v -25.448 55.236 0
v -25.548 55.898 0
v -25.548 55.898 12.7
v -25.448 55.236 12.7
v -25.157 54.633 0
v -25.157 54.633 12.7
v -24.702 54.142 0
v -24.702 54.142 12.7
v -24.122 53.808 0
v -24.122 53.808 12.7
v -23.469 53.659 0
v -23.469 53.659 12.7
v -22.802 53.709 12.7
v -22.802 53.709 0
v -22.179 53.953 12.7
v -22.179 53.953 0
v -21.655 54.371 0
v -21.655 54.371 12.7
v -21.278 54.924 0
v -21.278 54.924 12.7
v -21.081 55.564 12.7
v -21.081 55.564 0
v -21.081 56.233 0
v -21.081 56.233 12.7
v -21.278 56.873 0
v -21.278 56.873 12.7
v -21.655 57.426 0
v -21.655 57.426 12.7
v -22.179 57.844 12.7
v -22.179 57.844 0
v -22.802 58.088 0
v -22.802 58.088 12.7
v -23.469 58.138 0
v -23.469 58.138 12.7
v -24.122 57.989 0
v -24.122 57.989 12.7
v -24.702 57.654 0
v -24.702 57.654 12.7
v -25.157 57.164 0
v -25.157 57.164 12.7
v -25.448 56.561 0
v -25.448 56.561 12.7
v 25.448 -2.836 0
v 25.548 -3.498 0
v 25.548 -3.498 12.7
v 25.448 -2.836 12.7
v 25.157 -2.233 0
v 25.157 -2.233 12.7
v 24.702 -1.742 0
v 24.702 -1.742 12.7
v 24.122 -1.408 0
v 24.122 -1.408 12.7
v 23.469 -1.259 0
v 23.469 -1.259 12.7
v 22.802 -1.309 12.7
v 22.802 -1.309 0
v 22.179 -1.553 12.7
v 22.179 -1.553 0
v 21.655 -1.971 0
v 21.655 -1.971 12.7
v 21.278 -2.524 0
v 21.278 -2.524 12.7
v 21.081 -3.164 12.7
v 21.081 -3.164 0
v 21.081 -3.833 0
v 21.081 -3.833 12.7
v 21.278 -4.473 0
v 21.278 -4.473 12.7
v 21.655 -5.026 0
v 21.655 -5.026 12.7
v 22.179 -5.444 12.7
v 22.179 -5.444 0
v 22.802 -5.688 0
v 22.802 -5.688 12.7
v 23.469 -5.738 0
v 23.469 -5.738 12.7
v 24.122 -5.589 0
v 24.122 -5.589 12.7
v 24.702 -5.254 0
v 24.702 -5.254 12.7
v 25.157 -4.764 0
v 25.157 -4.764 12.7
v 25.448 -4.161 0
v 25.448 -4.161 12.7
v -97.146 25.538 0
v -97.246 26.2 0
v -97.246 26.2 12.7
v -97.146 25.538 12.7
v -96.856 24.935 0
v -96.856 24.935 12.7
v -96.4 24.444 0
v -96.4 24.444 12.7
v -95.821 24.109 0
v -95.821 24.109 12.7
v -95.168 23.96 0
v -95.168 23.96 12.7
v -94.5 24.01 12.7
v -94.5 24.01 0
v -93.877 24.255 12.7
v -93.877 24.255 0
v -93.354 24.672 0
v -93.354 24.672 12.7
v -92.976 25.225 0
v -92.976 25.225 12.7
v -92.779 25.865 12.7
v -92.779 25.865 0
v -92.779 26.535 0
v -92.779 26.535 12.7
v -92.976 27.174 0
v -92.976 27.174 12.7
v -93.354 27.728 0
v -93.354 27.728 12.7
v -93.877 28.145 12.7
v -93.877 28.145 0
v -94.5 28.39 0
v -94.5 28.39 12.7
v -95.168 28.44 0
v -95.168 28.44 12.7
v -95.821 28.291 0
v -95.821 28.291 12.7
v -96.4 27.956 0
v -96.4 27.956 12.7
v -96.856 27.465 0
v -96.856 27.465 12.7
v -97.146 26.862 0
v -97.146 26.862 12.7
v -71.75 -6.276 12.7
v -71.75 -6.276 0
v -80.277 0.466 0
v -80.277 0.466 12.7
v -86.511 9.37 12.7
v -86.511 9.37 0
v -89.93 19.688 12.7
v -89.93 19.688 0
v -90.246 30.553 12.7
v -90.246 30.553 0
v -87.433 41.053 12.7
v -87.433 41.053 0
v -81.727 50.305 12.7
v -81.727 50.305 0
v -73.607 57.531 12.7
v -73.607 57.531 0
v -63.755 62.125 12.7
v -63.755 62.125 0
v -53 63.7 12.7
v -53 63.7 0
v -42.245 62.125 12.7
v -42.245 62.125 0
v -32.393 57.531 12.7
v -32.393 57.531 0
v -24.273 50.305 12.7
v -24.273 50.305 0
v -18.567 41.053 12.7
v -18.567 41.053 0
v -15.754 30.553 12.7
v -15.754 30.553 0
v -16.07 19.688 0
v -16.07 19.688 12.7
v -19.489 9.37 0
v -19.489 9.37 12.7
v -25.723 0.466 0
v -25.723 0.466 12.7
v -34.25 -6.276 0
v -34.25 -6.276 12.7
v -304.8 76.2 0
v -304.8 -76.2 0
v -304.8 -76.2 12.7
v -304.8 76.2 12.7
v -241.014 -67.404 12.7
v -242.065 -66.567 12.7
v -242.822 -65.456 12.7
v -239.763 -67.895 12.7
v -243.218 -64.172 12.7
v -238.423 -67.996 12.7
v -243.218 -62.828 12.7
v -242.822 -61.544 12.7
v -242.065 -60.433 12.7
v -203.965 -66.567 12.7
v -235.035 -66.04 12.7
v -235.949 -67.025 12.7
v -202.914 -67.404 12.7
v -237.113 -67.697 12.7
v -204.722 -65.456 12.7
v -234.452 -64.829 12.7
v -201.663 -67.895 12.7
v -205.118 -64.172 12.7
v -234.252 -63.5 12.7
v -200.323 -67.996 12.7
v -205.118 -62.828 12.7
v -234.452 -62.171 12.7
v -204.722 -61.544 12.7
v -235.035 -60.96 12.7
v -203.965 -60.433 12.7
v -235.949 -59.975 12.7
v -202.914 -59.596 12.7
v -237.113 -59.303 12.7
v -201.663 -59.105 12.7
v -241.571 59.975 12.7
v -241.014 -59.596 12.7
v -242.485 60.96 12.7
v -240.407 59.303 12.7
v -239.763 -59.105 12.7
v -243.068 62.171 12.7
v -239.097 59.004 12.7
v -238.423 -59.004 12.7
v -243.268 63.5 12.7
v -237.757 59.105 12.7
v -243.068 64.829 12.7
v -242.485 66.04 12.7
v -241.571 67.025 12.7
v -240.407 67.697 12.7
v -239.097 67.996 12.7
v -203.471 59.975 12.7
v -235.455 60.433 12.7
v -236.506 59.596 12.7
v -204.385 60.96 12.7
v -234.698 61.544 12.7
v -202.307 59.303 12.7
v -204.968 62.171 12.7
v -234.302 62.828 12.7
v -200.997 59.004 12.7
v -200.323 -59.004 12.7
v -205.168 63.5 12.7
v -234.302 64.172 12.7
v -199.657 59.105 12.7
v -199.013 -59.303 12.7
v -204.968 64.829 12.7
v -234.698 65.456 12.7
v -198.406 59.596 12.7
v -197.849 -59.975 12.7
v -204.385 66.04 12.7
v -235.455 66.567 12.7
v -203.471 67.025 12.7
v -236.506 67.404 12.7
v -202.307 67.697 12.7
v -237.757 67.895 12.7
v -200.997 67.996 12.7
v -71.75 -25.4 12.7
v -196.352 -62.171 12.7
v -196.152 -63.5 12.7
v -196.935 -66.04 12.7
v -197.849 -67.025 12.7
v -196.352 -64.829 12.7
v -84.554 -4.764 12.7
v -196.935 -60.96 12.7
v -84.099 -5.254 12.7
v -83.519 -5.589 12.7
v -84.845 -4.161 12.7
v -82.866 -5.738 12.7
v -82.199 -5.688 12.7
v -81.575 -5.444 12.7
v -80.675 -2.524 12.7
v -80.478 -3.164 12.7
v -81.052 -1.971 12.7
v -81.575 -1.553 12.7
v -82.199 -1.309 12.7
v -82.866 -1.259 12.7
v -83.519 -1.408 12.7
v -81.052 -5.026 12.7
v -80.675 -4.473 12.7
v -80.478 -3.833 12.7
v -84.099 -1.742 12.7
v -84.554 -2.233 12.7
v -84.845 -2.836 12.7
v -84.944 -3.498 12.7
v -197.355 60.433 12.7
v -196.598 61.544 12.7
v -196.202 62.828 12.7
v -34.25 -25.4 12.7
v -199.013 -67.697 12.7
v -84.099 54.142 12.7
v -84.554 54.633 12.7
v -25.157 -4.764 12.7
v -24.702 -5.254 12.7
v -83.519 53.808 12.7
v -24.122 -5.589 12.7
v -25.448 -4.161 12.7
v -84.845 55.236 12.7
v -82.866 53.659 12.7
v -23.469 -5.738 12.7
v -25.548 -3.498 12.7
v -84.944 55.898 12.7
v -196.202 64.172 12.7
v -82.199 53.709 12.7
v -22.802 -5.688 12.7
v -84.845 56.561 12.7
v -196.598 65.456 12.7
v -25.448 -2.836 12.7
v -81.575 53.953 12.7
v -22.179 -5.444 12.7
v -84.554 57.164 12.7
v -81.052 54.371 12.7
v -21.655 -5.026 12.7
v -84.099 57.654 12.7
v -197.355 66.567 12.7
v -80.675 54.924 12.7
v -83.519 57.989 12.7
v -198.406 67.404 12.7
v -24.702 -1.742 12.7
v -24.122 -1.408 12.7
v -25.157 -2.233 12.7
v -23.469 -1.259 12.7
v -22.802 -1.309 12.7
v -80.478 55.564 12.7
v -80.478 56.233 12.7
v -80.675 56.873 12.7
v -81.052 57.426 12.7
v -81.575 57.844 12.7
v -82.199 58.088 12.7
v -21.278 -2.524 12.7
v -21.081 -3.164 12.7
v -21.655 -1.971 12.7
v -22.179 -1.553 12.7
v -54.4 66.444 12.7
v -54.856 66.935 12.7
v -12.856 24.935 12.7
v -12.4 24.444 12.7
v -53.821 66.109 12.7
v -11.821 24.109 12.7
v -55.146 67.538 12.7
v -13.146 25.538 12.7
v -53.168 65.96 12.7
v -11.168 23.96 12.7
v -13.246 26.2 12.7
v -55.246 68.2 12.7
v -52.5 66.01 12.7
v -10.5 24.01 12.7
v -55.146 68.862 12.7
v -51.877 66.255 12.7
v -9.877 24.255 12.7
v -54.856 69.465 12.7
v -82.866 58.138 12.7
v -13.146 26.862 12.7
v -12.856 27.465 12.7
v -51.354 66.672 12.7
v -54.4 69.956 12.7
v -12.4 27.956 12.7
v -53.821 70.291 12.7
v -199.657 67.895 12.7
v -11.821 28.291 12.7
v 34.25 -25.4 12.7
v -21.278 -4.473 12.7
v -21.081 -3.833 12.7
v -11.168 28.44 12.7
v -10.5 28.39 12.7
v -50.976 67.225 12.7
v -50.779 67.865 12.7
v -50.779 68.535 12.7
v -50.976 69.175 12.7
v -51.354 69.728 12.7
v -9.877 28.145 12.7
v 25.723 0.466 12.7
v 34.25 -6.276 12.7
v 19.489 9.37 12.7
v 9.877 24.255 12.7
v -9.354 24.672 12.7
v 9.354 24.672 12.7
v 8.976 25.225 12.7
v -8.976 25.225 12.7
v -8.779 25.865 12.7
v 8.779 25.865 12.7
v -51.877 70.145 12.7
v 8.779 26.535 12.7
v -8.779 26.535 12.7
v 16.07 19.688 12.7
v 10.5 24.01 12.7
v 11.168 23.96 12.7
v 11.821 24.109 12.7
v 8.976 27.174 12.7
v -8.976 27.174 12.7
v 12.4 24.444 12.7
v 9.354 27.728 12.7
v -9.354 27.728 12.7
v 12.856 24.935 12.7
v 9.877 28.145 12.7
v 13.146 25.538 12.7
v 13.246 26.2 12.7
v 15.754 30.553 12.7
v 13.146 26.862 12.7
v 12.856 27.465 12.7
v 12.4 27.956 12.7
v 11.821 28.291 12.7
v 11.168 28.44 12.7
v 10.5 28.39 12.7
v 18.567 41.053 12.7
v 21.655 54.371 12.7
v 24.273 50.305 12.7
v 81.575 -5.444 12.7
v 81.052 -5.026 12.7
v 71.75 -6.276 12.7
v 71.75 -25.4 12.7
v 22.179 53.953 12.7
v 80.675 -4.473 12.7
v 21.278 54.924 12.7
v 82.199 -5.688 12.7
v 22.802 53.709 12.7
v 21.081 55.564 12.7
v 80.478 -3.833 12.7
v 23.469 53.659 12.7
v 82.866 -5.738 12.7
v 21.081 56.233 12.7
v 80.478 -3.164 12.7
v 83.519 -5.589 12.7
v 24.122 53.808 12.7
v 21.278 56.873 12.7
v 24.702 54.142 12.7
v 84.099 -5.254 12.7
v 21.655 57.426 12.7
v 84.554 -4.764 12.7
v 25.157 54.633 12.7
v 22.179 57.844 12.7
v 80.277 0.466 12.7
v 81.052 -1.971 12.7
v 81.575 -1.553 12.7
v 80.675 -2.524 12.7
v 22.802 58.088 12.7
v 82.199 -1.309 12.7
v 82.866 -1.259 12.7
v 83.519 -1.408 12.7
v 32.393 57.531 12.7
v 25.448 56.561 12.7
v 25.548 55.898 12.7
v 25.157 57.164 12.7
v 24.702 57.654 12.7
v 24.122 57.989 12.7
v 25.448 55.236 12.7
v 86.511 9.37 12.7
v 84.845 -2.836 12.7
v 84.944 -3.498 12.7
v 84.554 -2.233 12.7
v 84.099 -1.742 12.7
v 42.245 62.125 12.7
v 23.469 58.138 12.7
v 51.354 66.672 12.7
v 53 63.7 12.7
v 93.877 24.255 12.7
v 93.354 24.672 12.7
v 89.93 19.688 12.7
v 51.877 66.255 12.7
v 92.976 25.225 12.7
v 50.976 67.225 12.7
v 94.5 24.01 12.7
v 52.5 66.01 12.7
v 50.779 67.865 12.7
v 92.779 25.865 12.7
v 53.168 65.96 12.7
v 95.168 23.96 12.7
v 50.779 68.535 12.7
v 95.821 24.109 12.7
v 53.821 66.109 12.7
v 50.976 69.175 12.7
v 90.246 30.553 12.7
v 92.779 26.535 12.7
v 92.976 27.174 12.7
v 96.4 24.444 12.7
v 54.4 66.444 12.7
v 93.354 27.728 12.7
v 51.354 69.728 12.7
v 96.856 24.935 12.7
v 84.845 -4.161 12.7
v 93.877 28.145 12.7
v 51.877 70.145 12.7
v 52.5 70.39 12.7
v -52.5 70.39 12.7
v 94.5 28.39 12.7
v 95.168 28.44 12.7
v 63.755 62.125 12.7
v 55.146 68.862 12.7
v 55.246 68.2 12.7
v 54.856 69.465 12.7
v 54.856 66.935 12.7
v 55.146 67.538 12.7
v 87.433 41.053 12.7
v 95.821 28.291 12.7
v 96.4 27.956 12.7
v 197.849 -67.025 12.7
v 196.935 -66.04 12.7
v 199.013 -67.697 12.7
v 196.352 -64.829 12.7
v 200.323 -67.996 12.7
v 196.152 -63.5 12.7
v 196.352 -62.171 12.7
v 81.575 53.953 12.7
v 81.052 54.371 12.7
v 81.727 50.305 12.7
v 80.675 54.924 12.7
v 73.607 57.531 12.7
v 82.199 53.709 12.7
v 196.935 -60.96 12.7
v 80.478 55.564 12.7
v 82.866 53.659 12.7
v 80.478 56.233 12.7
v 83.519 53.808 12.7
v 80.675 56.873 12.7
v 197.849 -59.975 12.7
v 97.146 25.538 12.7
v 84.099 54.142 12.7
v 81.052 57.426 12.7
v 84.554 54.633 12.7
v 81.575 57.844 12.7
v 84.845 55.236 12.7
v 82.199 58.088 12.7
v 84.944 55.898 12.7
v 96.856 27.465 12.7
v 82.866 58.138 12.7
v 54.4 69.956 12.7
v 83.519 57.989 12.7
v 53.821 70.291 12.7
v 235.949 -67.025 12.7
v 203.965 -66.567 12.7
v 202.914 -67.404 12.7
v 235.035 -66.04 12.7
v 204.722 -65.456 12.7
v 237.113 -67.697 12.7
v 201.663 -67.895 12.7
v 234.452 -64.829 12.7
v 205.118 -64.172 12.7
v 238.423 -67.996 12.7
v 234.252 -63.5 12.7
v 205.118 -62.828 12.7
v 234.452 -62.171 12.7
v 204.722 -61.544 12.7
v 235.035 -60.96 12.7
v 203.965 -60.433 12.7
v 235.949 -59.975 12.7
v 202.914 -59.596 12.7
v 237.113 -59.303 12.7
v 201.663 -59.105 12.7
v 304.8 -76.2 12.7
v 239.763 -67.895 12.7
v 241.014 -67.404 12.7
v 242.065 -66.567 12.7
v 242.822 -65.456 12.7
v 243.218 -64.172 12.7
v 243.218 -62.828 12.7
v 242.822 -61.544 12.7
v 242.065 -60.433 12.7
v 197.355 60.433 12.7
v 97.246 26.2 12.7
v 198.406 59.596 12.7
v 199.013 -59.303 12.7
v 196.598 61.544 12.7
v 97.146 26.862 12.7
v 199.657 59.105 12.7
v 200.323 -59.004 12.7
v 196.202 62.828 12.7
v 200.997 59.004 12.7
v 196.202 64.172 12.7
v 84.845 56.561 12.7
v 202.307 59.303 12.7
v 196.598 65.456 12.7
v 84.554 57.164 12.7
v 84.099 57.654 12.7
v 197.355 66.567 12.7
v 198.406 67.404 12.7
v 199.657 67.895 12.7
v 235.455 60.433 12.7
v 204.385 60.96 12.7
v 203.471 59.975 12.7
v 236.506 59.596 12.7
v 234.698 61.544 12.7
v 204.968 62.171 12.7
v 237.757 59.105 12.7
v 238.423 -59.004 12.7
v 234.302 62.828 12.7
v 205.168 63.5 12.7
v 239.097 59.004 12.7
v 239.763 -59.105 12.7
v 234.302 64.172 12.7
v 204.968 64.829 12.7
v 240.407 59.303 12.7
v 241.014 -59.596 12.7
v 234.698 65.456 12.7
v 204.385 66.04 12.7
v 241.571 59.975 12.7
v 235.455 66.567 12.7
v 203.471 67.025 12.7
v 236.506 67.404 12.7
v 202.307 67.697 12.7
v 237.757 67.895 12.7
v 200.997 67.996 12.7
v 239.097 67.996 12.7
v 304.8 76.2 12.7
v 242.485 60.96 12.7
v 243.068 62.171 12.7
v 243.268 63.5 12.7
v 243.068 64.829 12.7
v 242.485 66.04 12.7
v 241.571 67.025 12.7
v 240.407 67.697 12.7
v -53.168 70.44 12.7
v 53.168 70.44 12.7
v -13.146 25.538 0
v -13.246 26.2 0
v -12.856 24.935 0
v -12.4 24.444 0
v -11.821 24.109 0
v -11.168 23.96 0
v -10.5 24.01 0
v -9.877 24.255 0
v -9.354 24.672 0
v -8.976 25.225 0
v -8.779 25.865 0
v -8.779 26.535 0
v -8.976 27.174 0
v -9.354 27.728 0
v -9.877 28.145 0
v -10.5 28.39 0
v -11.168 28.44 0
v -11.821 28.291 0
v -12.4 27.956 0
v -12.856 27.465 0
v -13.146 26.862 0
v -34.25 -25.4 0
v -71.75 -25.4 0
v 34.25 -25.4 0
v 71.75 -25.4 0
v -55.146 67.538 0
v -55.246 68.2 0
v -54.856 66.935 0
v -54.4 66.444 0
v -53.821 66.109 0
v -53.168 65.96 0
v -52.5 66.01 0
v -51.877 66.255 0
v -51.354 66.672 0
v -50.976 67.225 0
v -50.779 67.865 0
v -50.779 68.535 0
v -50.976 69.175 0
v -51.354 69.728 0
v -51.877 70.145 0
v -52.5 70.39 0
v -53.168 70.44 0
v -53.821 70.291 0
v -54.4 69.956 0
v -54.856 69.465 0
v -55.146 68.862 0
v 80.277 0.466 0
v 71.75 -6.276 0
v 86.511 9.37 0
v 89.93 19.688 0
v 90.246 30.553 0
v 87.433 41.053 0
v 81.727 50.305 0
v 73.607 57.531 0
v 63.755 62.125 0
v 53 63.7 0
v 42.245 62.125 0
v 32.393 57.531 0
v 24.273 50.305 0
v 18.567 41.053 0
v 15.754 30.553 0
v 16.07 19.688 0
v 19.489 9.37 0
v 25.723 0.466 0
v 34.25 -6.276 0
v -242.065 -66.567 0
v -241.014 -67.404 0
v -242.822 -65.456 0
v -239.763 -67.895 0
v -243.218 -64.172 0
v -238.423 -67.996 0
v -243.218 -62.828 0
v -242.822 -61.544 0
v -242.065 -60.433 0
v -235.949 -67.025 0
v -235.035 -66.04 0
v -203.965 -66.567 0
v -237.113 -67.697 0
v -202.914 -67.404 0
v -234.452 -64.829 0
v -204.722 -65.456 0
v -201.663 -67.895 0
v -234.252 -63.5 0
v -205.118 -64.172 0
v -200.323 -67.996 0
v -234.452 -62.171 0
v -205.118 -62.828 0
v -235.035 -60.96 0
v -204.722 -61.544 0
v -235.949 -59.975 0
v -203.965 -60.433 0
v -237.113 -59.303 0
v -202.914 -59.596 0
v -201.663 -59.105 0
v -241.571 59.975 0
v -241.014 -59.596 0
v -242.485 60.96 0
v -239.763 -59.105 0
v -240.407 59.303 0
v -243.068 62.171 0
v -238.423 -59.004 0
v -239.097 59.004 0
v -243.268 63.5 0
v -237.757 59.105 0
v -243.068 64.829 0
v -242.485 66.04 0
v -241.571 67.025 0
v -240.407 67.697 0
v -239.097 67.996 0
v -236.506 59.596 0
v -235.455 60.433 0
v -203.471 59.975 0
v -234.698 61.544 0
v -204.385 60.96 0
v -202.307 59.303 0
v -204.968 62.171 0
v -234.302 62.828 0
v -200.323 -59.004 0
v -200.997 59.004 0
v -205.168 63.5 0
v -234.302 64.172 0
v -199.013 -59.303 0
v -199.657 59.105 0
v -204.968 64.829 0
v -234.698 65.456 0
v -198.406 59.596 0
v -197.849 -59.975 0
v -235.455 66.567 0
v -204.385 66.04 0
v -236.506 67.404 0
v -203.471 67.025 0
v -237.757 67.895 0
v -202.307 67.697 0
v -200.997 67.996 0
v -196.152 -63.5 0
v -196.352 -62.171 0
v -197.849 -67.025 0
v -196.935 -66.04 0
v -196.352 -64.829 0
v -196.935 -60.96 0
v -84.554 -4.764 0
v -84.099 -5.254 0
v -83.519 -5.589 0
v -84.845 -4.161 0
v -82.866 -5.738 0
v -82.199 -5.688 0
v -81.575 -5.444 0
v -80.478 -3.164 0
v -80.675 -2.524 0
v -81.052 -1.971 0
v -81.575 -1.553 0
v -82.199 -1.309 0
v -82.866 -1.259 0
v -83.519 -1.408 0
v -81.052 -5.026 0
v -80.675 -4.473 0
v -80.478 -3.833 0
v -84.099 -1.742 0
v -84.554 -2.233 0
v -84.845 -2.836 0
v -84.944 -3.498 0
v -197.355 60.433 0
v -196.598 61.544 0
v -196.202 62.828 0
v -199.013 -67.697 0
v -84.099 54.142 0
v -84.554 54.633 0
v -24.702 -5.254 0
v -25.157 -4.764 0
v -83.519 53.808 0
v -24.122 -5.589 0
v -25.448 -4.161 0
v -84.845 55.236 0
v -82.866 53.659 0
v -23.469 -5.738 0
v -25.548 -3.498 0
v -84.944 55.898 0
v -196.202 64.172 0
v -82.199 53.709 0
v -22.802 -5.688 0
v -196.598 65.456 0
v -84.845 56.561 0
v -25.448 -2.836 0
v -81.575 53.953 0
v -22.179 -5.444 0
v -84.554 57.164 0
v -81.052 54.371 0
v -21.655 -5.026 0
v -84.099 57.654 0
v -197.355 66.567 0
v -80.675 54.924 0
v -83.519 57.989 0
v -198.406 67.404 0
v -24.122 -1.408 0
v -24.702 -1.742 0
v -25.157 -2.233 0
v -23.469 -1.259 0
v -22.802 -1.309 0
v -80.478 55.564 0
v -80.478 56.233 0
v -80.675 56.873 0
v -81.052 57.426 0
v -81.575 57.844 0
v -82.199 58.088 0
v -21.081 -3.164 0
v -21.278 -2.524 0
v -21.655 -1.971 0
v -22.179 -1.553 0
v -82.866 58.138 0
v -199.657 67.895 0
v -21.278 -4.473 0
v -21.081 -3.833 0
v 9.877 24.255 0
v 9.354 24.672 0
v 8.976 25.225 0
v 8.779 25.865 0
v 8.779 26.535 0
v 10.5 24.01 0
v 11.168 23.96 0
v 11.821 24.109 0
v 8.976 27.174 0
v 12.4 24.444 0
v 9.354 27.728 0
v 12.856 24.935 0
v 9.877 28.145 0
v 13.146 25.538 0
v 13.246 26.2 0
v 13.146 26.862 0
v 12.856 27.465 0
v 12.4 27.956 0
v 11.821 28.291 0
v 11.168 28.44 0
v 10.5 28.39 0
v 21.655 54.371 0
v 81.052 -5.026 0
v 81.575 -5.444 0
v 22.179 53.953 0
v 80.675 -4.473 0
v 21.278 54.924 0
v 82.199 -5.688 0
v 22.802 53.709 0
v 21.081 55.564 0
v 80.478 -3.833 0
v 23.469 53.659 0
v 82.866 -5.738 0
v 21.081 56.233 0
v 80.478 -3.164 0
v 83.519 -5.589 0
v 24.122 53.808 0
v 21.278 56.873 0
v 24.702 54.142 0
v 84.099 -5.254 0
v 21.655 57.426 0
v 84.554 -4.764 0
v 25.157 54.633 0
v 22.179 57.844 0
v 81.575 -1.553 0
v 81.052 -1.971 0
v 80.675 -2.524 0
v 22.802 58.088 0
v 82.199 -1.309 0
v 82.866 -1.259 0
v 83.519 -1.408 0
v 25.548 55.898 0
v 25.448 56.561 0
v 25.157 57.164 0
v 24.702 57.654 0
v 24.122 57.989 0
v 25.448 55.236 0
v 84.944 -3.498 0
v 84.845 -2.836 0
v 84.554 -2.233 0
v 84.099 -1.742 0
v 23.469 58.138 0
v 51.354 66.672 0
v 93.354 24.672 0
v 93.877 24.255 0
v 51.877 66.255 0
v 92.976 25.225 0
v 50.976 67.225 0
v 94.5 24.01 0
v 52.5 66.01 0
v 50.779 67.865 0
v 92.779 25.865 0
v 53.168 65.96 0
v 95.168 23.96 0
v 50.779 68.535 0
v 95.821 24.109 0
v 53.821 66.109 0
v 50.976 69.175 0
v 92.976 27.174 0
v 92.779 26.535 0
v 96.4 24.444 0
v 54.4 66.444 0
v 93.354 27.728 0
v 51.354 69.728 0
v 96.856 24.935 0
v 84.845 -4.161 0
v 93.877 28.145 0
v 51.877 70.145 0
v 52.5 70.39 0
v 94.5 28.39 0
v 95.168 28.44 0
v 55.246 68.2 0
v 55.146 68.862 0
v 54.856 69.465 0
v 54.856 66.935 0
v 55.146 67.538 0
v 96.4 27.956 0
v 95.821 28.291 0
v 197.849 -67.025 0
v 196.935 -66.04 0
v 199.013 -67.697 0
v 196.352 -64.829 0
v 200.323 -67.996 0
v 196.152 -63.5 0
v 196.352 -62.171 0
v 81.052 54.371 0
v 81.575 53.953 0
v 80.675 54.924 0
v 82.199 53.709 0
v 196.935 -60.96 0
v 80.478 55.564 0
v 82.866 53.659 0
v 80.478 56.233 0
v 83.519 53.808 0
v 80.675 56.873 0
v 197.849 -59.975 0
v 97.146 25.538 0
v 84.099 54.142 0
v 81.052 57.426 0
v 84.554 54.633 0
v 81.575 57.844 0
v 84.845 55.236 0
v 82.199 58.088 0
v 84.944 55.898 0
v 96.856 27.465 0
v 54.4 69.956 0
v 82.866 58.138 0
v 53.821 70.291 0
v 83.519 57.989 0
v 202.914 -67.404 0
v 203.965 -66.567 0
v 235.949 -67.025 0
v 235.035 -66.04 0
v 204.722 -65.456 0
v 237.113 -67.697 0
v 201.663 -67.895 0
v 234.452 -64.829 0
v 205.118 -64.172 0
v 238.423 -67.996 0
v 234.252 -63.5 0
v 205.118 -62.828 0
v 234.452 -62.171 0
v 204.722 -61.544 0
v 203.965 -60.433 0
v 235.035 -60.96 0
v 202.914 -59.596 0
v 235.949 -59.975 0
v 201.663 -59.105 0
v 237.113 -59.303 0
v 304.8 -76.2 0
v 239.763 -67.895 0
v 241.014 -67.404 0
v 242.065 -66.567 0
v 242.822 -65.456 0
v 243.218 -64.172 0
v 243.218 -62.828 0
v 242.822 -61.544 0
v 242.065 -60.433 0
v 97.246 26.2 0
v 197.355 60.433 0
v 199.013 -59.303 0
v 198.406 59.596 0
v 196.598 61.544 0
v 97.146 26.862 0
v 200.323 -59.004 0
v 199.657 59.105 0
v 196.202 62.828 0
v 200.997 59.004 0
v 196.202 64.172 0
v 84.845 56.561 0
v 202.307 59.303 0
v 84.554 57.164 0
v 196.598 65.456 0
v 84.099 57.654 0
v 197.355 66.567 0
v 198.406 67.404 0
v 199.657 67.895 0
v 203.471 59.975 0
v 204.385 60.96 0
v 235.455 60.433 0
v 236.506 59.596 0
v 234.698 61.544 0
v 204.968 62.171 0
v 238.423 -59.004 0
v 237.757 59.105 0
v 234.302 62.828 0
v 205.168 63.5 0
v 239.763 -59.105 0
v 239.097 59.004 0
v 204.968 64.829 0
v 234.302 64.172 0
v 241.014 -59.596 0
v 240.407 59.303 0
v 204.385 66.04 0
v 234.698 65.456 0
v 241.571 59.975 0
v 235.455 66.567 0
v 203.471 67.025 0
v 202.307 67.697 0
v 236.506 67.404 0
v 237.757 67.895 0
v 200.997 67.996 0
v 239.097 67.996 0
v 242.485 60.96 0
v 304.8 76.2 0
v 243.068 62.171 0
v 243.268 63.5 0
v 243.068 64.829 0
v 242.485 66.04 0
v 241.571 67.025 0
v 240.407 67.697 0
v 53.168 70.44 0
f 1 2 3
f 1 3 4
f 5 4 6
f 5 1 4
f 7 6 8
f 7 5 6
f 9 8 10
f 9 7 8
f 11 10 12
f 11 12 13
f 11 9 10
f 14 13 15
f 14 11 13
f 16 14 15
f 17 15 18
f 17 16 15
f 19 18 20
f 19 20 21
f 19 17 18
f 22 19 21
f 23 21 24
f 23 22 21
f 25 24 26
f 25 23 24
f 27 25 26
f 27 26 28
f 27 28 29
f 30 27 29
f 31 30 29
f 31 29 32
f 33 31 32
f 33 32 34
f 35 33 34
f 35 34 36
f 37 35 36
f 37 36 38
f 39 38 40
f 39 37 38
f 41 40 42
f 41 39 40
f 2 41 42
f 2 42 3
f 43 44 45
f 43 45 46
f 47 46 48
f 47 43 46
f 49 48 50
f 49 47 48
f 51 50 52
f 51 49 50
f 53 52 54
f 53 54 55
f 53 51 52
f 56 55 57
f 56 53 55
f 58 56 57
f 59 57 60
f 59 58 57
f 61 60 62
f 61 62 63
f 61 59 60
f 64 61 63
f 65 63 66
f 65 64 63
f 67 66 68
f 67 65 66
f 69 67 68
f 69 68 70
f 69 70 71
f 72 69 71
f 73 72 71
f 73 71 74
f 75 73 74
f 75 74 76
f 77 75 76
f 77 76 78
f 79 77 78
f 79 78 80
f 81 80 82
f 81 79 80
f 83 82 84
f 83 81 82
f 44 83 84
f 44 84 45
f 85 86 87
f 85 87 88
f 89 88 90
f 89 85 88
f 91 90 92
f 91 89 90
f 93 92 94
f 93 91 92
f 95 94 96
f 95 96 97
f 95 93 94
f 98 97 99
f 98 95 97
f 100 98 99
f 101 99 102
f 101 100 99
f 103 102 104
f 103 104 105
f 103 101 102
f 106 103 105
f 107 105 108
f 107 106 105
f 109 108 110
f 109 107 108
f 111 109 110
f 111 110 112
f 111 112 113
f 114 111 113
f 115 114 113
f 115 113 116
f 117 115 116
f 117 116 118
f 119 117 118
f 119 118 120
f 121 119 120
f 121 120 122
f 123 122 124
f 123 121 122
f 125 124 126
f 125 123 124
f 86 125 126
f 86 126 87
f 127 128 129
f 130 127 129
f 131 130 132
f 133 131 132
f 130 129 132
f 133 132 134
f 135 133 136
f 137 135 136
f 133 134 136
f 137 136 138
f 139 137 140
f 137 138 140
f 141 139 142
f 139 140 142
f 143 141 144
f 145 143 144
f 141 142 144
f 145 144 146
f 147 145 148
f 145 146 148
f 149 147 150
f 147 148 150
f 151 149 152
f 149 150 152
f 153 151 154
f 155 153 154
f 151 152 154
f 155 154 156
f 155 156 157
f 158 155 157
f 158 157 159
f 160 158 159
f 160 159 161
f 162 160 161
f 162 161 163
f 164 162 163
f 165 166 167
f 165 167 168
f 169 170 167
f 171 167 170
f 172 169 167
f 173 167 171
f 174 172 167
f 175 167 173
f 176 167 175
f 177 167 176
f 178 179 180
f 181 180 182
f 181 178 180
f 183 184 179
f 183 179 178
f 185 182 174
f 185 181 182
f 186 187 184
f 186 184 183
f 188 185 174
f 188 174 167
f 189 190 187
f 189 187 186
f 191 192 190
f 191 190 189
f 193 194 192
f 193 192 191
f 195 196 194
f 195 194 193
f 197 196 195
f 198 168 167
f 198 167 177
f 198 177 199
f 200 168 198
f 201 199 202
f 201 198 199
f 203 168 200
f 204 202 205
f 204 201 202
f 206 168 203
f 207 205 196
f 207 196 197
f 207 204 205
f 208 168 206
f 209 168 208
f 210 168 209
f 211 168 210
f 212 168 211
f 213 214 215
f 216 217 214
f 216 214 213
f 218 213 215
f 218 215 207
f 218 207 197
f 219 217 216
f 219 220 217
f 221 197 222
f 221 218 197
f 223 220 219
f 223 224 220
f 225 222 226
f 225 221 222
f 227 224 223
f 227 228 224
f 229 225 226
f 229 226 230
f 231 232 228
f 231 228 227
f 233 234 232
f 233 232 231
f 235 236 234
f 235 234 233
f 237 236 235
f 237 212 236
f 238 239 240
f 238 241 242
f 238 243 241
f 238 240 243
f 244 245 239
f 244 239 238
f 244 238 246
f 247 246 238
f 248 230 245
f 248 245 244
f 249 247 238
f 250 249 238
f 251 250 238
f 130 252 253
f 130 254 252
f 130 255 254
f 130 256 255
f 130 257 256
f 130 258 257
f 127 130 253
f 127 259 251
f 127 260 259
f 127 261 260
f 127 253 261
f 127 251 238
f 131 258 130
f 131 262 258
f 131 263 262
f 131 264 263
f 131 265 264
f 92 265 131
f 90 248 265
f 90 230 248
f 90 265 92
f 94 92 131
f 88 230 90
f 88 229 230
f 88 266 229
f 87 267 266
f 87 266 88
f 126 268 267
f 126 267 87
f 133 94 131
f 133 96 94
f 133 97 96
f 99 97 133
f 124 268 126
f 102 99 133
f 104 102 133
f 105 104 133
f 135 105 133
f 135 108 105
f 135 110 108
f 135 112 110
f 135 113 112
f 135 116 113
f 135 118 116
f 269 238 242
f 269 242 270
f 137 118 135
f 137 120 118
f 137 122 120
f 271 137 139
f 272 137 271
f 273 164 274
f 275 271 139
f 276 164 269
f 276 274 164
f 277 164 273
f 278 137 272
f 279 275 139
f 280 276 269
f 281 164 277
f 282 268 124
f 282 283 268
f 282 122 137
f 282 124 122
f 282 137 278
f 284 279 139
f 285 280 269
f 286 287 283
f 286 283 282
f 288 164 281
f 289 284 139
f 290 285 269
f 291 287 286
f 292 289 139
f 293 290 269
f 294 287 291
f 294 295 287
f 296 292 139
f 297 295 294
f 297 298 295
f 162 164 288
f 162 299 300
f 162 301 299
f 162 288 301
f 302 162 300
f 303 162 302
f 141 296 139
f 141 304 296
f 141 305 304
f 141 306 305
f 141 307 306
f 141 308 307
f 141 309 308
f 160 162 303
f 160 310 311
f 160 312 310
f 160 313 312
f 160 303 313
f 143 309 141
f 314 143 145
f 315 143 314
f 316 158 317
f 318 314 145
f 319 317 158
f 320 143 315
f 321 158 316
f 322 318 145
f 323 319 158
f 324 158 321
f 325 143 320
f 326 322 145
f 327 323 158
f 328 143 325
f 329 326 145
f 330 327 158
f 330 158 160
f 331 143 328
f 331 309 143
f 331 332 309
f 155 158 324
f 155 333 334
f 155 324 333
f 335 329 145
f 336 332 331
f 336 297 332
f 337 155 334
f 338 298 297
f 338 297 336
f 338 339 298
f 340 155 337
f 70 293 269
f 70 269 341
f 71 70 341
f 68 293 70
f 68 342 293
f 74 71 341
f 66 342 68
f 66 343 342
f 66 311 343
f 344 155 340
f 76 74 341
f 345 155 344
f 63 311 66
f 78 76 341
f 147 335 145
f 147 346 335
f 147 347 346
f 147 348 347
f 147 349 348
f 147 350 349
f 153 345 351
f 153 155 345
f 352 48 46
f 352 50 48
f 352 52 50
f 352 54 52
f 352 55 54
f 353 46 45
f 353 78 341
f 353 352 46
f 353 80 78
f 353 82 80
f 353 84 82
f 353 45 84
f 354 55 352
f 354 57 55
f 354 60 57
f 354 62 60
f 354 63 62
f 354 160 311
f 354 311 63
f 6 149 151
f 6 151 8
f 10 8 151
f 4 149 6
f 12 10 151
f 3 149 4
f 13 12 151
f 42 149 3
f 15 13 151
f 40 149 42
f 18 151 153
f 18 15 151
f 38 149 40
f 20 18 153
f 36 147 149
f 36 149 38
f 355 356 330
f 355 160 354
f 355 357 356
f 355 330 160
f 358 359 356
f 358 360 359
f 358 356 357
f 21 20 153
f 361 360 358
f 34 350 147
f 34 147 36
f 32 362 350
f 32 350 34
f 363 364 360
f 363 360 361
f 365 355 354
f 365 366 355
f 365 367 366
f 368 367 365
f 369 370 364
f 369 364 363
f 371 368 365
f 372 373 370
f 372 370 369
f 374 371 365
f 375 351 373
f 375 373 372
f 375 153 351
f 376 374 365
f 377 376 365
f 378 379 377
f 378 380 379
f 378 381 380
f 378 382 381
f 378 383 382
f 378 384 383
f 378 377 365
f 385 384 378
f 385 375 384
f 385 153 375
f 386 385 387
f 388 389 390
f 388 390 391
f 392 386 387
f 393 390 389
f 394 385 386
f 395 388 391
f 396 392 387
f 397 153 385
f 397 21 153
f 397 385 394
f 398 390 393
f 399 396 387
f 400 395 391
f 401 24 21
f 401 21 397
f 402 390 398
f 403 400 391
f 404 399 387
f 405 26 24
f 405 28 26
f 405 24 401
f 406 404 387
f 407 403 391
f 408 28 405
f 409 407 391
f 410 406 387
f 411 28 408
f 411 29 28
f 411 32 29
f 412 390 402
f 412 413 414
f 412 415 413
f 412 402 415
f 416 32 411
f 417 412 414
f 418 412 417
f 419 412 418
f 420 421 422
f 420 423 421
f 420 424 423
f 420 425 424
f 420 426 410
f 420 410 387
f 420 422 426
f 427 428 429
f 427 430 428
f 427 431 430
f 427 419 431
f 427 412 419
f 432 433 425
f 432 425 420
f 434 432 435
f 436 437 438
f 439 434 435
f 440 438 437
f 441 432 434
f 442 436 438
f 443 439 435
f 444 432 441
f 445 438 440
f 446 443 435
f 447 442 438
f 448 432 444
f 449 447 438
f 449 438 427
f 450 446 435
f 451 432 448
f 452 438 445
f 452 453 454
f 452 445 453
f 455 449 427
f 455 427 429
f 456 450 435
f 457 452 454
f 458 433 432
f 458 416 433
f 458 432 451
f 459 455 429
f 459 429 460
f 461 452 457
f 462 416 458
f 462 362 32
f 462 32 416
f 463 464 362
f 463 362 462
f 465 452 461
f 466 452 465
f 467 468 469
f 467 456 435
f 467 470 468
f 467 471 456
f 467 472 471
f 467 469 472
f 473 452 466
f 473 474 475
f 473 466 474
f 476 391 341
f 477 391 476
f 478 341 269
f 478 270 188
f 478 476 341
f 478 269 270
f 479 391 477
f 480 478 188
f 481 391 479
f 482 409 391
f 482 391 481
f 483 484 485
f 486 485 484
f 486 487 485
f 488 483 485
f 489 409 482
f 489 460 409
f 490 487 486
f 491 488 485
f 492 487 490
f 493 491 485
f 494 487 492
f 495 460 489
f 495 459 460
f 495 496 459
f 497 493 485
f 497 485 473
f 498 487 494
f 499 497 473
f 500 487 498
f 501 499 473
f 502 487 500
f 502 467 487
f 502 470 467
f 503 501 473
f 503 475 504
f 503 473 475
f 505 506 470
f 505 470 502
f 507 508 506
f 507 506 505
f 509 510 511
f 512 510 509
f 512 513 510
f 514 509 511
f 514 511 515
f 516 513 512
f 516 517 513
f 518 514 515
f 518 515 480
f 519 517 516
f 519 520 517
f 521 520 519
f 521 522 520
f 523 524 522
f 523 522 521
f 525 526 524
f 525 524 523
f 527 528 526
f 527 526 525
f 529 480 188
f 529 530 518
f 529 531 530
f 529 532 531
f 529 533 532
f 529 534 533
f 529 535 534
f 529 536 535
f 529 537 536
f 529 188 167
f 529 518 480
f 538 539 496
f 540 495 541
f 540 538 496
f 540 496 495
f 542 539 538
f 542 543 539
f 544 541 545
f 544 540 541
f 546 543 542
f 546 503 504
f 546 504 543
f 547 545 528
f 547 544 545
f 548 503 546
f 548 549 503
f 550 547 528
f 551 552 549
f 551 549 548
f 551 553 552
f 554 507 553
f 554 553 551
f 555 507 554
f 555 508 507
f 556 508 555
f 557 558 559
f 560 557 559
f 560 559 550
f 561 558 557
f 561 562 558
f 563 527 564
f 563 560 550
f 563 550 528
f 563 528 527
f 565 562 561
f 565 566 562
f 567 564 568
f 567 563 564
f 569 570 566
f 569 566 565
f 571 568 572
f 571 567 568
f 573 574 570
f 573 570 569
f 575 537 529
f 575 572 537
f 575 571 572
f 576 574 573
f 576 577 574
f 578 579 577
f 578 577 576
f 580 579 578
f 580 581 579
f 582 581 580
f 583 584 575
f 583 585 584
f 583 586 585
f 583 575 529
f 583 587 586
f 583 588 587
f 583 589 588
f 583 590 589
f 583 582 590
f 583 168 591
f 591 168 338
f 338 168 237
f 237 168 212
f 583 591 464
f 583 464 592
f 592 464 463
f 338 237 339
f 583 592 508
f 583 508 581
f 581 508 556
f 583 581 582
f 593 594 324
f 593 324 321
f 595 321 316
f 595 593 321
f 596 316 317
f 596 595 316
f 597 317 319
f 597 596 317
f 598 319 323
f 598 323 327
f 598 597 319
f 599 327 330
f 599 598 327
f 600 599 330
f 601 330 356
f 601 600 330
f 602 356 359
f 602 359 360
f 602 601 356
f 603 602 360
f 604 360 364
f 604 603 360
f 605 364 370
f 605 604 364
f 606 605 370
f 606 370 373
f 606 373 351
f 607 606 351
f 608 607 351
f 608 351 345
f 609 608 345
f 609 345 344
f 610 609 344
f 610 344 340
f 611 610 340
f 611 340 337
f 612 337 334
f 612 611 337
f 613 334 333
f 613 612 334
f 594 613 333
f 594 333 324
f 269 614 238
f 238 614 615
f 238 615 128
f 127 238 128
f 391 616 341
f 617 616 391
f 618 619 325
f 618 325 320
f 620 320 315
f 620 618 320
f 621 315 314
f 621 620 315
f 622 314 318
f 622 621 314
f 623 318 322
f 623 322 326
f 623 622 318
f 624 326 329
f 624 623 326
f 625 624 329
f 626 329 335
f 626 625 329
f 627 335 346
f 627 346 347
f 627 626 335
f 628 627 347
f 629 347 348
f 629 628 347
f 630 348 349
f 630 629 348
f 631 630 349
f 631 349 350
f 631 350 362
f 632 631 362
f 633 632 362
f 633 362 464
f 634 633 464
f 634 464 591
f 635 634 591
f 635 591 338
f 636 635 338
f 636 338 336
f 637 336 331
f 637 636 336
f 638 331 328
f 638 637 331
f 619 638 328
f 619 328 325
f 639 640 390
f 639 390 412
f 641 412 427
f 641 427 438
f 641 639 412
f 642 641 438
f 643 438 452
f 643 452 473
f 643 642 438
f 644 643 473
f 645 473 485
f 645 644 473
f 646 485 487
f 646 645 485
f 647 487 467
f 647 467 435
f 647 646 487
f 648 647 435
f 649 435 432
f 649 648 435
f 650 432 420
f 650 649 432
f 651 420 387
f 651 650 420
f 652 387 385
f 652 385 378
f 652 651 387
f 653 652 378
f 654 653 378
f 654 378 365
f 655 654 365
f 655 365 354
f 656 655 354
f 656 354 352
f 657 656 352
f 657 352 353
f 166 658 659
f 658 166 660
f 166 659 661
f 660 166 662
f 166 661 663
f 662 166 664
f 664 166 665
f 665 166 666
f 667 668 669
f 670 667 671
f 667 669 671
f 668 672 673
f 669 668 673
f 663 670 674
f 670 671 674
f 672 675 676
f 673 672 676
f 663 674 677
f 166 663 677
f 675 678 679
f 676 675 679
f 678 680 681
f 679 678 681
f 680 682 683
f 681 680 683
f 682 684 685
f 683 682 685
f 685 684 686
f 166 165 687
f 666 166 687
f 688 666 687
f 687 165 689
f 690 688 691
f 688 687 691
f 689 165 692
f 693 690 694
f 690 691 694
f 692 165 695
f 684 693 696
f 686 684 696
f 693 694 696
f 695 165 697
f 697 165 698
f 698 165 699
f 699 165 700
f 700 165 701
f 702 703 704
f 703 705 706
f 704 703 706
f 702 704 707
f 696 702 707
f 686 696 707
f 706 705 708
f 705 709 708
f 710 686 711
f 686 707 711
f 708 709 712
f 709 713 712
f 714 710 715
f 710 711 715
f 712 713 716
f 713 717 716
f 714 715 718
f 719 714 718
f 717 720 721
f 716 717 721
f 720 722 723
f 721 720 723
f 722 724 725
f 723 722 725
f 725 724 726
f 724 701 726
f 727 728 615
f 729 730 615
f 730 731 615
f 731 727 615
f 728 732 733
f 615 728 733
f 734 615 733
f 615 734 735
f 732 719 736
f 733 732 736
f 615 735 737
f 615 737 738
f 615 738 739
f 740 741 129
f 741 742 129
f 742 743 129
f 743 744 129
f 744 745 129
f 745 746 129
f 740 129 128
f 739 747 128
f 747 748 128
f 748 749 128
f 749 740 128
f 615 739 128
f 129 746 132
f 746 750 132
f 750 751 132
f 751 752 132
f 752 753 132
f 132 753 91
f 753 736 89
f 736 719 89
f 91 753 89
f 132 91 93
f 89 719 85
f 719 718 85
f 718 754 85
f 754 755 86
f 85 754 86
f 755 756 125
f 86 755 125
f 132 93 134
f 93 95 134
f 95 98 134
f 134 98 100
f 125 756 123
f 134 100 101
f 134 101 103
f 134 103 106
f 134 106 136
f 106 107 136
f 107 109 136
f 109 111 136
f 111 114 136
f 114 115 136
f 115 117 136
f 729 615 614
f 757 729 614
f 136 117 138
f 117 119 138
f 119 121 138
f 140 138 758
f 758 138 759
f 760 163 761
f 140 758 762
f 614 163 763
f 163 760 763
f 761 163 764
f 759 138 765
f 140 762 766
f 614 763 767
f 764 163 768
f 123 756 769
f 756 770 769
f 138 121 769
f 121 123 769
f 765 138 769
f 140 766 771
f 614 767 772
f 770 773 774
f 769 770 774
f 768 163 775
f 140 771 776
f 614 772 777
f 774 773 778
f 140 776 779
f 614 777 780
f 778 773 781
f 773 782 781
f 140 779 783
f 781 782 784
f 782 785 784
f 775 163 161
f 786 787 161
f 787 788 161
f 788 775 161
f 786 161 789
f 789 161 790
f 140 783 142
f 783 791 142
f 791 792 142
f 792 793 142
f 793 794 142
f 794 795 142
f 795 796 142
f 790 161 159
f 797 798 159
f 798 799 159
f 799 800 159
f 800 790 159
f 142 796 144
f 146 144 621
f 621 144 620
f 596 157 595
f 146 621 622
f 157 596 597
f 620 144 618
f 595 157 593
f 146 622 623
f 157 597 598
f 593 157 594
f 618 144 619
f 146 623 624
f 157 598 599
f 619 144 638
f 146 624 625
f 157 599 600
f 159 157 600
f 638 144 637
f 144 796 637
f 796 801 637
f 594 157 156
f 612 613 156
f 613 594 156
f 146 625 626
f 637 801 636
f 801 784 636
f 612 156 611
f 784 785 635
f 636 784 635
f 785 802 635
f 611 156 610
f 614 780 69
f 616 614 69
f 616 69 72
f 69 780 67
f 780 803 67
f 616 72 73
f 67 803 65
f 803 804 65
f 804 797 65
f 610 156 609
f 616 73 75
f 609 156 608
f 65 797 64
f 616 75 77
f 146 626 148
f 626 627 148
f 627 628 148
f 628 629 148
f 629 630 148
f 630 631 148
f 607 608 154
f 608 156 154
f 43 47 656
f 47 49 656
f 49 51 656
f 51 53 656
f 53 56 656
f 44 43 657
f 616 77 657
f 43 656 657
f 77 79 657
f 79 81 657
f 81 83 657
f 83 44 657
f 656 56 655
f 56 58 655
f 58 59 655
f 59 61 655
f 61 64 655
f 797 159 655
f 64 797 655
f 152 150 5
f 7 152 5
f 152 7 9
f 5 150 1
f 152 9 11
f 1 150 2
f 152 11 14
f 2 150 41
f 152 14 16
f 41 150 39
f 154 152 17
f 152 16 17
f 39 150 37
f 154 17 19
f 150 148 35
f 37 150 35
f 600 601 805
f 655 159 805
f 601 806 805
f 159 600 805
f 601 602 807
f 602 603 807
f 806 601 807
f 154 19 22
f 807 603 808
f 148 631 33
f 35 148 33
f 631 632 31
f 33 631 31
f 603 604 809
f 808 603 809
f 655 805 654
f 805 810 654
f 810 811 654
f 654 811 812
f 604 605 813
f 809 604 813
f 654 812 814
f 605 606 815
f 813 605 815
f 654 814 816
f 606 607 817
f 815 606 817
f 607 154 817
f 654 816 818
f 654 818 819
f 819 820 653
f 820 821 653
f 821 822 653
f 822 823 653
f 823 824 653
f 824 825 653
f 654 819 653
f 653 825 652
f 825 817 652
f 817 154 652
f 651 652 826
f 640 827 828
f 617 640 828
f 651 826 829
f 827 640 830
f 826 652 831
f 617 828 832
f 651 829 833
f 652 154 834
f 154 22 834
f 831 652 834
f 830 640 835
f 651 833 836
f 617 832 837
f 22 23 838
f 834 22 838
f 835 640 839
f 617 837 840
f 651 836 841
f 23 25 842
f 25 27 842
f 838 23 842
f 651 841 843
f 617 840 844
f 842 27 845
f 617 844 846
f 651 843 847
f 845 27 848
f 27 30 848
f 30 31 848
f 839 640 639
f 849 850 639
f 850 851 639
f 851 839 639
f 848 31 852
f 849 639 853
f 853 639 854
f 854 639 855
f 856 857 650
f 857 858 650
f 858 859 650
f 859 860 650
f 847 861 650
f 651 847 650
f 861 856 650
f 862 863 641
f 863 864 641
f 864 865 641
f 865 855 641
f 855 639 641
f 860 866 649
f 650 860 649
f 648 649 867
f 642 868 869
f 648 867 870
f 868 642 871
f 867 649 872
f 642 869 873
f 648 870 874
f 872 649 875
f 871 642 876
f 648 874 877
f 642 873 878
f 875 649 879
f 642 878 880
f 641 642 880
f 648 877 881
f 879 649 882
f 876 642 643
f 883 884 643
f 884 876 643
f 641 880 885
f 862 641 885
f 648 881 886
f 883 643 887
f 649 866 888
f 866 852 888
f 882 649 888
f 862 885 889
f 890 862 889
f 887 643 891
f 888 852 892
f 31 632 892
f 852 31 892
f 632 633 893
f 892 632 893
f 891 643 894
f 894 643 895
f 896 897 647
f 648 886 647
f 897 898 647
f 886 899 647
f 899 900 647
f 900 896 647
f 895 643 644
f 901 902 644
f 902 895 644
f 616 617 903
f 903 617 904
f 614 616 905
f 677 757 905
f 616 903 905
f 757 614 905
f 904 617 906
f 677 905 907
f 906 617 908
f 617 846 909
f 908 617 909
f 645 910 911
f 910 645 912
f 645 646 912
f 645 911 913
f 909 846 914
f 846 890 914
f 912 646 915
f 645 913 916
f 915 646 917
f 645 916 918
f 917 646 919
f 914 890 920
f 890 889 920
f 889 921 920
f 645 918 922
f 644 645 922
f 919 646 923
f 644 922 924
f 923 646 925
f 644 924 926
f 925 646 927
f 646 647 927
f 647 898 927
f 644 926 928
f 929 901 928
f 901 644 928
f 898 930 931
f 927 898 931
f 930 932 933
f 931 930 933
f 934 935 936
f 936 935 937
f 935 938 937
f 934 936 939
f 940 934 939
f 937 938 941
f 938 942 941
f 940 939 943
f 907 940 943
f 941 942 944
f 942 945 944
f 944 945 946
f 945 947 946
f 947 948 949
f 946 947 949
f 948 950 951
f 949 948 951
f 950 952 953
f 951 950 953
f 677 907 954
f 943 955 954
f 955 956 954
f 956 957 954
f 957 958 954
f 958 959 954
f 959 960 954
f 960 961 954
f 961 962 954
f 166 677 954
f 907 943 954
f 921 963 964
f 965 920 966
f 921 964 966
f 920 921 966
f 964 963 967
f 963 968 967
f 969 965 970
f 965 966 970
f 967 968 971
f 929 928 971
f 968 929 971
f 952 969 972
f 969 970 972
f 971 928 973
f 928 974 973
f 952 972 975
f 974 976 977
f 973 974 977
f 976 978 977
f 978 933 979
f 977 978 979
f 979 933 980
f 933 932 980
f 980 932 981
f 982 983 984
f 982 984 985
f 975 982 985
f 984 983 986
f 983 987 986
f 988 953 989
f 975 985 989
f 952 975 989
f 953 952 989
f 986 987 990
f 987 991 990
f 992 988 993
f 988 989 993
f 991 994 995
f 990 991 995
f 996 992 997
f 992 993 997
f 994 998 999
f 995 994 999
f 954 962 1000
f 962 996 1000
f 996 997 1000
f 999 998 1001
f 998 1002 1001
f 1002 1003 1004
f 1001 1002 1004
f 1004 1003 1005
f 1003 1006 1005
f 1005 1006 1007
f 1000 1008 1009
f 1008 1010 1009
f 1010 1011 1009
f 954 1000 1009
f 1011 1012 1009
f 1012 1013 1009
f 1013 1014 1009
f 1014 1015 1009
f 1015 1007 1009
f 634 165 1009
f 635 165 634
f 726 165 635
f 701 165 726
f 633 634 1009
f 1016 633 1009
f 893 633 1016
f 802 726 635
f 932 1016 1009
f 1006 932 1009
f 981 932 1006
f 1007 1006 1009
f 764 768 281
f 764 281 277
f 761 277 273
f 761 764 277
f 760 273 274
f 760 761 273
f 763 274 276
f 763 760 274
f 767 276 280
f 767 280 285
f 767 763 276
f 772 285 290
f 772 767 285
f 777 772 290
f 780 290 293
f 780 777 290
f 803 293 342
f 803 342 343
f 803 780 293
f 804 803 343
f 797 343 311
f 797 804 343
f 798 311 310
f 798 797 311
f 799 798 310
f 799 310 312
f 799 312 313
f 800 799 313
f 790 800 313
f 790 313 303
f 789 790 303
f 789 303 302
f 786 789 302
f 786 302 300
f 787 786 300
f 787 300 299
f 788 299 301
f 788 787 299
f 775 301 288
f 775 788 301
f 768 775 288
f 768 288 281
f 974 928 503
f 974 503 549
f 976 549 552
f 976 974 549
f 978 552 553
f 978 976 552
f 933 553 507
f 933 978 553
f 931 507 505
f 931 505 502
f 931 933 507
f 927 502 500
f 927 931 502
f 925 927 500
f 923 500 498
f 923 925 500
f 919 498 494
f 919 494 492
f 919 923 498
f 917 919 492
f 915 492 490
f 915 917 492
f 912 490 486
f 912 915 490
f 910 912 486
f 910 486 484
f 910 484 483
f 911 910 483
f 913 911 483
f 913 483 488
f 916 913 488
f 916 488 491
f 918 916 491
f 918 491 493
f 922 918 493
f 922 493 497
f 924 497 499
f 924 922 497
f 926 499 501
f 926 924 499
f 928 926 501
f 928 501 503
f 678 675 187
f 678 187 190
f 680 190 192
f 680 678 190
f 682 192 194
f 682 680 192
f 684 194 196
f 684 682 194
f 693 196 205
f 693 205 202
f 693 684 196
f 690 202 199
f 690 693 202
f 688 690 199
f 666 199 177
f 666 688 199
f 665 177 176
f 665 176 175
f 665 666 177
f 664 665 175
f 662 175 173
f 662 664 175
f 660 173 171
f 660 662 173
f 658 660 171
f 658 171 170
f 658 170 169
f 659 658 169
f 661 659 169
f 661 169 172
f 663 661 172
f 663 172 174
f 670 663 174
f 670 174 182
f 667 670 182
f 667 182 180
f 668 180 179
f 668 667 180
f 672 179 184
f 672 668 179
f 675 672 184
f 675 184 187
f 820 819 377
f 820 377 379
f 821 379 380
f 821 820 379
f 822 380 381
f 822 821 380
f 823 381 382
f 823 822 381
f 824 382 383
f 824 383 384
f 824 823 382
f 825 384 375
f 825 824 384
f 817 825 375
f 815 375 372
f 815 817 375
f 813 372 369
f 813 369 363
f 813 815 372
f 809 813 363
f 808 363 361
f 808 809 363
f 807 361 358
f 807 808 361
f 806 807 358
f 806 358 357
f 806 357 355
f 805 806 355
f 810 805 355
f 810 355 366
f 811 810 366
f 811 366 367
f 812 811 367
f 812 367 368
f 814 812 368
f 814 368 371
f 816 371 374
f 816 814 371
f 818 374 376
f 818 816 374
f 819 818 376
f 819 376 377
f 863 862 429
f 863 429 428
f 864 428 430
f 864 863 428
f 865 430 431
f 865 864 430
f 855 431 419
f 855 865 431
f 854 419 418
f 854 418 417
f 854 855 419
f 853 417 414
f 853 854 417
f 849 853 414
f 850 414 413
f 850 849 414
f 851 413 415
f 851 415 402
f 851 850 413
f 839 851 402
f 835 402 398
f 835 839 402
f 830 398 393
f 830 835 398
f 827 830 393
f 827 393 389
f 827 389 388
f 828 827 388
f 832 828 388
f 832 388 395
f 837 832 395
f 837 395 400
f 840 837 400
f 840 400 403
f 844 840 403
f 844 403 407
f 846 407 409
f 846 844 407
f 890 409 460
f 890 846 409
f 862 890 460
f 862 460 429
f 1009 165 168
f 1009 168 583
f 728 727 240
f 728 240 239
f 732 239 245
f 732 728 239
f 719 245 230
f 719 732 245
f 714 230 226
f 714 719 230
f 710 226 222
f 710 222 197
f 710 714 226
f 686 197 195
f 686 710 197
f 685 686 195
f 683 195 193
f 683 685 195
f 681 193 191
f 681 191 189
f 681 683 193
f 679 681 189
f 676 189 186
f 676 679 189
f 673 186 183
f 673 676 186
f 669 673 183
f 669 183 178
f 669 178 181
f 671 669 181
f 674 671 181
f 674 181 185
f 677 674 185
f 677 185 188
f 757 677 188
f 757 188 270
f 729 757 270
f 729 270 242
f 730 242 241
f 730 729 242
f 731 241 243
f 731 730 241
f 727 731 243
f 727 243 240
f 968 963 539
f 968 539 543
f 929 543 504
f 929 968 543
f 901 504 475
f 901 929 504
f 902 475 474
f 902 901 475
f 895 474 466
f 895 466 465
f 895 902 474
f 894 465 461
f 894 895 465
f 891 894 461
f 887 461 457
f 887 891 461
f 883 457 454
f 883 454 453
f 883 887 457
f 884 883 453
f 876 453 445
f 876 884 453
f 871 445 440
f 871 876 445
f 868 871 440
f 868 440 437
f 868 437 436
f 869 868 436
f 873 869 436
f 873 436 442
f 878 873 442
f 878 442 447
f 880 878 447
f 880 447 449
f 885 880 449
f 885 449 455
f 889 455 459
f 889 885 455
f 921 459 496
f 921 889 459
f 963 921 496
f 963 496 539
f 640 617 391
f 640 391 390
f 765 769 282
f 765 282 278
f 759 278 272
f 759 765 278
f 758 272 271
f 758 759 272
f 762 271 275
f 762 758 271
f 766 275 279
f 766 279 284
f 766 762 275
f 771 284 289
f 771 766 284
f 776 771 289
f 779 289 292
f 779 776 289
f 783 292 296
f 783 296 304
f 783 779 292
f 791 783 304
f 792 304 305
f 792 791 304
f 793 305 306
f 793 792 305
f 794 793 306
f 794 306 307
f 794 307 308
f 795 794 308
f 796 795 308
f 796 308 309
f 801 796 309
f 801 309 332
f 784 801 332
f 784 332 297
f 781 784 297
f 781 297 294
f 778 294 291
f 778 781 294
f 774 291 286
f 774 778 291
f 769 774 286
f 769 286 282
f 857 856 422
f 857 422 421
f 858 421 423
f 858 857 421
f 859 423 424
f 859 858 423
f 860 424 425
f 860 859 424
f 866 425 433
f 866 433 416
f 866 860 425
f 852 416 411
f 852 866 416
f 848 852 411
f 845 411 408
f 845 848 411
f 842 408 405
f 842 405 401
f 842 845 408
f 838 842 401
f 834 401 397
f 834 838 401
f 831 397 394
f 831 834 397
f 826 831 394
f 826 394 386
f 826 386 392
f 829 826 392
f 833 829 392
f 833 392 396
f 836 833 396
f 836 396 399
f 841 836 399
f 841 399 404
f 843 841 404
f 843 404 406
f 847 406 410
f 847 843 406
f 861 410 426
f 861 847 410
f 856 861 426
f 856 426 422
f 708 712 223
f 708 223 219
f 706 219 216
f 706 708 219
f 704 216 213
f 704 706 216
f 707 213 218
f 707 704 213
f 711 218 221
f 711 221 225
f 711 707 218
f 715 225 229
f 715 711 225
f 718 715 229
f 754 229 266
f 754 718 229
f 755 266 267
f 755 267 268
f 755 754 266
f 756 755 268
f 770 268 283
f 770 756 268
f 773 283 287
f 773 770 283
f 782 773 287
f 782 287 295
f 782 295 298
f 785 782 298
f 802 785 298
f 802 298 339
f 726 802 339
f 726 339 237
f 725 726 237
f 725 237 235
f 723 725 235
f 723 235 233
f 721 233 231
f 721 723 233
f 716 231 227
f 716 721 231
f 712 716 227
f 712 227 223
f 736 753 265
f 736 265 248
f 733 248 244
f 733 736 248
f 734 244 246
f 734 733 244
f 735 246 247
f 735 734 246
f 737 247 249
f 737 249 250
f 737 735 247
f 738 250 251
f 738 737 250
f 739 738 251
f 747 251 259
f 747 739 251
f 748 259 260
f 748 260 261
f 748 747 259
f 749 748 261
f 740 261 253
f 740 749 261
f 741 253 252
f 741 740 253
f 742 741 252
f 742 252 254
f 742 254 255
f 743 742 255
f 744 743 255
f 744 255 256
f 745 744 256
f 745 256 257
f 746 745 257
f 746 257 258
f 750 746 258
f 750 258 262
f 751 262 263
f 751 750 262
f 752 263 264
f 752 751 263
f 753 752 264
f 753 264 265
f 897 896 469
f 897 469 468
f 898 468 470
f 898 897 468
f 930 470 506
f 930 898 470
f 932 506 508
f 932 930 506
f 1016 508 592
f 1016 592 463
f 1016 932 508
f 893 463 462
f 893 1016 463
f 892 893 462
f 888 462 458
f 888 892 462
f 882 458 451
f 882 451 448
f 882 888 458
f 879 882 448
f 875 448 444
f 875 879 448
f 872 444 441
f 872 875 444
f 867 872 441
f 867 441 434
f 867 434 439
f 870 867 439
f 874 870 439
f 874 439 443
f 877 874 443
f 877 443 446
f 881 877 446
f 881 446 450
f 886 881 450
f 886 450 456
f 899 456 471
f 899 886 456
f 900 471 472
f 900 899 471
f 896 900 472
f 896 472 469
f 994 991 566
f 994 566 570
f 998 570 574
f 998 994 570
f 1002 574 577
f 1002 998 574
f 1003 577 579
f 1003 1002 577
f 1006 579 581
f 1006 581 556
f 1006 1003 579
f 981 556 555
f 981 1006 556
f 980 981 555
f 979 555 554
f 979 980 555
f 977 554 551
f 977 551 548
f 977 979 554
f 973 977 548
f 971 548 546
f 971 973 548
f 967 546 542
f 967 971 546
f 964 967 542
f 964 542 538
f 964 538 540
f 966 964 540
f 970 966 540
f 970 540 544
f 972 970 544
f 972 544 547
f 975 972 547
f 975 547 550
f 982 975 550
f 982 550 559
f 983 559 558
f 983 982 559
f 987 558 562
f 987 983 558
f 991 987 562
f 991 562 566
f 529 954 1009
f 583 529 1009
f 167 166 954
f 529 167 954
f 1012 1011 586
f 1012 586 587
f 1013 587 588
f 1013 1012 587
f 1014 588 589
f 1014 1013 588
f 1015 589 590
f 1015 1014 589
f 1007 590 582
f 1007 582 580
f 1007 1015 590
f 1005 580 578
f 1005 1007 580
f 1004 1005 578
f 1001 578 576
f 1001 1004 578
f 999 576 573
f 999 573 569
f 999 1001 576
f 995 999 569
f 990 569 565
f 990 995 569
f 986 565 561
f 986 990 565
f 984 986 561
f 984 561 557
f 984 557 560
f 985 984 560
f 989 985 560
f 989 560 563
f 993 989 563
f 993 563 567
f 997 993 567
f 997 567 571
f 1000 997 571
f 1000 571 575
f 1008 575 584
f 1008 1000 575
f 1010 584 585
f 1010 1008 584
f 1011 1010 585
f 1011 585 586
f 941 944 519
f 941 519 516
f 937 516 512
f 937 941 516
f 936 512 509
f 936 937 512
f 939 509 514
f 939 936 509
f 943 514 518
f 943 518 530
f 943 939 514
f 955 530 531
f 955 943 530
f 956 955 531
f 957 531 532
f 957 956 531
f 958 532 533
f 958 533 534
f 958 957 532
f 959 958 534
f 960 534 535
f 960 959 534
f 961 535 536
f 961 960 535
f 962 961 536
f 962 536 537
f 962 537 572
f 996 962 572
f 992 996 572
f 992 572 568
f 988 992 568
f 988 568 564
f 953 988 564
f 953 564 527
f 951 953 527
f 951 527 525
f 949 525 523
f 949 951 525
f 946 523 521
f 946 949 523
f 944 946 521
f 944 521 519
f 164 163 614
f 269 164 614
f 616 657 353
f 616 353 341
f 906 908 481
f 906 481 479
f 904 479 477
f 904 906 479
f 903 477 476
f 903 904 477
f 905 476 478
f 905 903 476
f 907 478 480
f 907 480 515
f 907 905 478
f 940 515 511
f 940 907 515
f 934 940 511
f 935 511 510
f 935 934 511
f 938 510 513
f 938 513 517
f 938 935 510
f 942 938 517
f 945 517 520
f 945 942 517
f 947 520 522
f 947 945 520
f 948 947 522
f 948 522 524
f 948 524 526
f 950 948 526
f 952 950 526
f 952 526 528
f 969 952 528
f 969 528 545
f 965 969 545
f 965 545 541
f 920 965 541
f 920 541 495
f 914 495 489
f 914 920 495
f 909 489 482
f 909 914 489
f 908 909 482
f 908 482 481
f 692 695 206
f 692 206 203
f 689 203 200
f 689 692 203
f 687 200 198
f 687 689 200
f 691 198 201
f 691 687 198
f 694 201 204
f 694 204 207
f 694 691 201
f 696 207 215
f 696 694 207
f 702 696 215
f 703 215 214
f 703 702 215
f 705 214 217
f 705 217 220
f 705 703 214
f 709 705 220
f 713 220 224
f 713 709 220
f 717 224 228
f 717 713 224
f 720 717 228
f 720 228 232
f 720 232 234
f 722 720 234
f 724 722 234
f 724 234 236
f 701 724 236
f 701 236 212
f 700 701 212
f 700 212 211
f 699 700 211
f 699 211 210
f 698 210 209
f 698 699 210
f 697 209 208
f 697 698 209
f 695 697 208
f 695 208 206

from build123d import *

# Parameters (mm, degrees)
SKETCH1_W           = 609.6
SKETCH1_H           = 152.4
SKETCH1_R           = 2.246
SKETCH1_R_2         = 4.5085
BOSS_EXTRUDE1_DEPTH = 12.7


with BuildPart() as part:
    # Sketch1 → Boss-Extrude1 (new body)
    with BuildSketch(Plane.XY):
        Rectangle(SKETCH1_W, SKETCH1_H)
        with Locations((53, 68.1999984)):
            Circle(SKETCH1_R, mode=Mode.SUBTRACT)
        with Locations((82.698486542, 55.898482492)):
            Circle(SKETCH1_R, mode=Mode.SUBTRACT)
        with Locations((95.00000245, 26.19999595)):
            Circle(SKETCH1_R, mode=Mode.SUBTRACT)
        with Locations((82.698486542, -3.498490592)):
            Circle(SKETCH1_R, mode=Mode.SUBTRACT)
        with Locations((23.301513458, -3.498490592)):
            Circle(SKETCH1_R, mode=Mode.SUBTRACT)
        with Locations((10.99999755, 26.19999595)):
            Circle(SKETCH1_R, mode=Mode.SUBTRACT)
        with Locations((23.301513458, 55.898482492)):
            Circle(SKETCH1_R, mode=Mode.SUBTRACT)
        with Locations((238.76, 63.5)):
            Circle(SKETCH1_R_2, mode=Mode.SUBTRACT)
        with Locations((200.66, 63.5)):
            Circle(SKETCH1_R_2, mode=Mode.SUBTRACT)
        with Locations(Location((238.76, -63.5, 0), (0, 0, 180))):
            Circle(SKETCH1_R_2, mode=Mode.SUBTRACT)
        with Locations(Location((200.66, -63.5, 0), (0, 0, 180))):
            Circle(SKETCH1_R_2, mode=Mode.SUBTRACT)
        with Locations(Location((-82.698486542, -3.498490592, 0), (0, 0, 180))):
            Circle(SKETCH1_R, mode=Mode.SUBTRACT)
        with Locations(Location((-95.00000245, 26.19999595, 0), (0, 0, 180))):
            Circle(SKETCH1_R, mode=Mode.SUBTRACT)
        with Locations(Location((-82.698486542, 55.898482492, 0), (0, 0, 180))):
            Circle(SKETCH1_R, mode=Mode.SUBTRACT)
        with Locations(Location((-53, 68.1999984, 0), (0, 0, 180))):
            Circle(SKETCH1_R, mode=Mode.SUBTRACT)
        with Locations(Location((-23.301513458, 55.898482492, 0), (0, 0, 180))):
            Circle(SKETCH1_R, mode=Mode.SUBTRACT)
        with Locations(Location((-10.99999755, 26.19999595, 0), (0, 0, 180))):
            Circle(SKETCH1_R, mode=Mode.SUBTRACT)
        with Locations(Location((-23.301513458, -3.498490592, 0), (0, 0, 180))):
            Circle(SKETCH1_R, mode=Mode.SUBTRACT)
        with Locations(Location((-238.76, 63.5, 0), (0, 0, 180))):
            Circle(SKETCH1_R_2, mode=Mode.SUBTRACT)
        with Locations(Location((-200.66, 63.5, 0), (0, 0, 180))):
            Circle(SKETCH1_R_2, mode=Mode.SUBTRACT)
        with Locations((-200.66, -63.5)):
            Circle(SKETCH1_R_2, mode=Mode.SUBTRACT)
        with Locations((-238.76, -63.5)):
            Circle(SKETCH1_R_2, mode=Mode.SUBTRACT)
        with BuildLine():
            Line((34.25, -6.275954242), (34.25, -25.4))
            Line((34.25, -25.4), (71.75, -25.4))
            Line((71.75, -25.4), (71.75, -6.275954242))
            ThreePointArc((71.75, -6.275954242), (53, 63.6999984), (34.25, -6.275954242))
        make_face(mode=Mode.SUBTRACT)
        with BuildLine():
            Line((-34.25, -6.275954242), (-34.25, -25.4))
            Line((-34.25, -25.4), (-71.75, -25.4))
            Line((-71.75, -25.4), (-71.75, -6.275954242))
            ThreePointArc((-71.75, -6.275954242), (-53, 63.6999984), (-34.25, -6.275954242))
        make_face(mode=Mode.SUBTRACT)
    extrude(amount=BOSS_EXTRUDE1_DEPTH)


solid = part.part
